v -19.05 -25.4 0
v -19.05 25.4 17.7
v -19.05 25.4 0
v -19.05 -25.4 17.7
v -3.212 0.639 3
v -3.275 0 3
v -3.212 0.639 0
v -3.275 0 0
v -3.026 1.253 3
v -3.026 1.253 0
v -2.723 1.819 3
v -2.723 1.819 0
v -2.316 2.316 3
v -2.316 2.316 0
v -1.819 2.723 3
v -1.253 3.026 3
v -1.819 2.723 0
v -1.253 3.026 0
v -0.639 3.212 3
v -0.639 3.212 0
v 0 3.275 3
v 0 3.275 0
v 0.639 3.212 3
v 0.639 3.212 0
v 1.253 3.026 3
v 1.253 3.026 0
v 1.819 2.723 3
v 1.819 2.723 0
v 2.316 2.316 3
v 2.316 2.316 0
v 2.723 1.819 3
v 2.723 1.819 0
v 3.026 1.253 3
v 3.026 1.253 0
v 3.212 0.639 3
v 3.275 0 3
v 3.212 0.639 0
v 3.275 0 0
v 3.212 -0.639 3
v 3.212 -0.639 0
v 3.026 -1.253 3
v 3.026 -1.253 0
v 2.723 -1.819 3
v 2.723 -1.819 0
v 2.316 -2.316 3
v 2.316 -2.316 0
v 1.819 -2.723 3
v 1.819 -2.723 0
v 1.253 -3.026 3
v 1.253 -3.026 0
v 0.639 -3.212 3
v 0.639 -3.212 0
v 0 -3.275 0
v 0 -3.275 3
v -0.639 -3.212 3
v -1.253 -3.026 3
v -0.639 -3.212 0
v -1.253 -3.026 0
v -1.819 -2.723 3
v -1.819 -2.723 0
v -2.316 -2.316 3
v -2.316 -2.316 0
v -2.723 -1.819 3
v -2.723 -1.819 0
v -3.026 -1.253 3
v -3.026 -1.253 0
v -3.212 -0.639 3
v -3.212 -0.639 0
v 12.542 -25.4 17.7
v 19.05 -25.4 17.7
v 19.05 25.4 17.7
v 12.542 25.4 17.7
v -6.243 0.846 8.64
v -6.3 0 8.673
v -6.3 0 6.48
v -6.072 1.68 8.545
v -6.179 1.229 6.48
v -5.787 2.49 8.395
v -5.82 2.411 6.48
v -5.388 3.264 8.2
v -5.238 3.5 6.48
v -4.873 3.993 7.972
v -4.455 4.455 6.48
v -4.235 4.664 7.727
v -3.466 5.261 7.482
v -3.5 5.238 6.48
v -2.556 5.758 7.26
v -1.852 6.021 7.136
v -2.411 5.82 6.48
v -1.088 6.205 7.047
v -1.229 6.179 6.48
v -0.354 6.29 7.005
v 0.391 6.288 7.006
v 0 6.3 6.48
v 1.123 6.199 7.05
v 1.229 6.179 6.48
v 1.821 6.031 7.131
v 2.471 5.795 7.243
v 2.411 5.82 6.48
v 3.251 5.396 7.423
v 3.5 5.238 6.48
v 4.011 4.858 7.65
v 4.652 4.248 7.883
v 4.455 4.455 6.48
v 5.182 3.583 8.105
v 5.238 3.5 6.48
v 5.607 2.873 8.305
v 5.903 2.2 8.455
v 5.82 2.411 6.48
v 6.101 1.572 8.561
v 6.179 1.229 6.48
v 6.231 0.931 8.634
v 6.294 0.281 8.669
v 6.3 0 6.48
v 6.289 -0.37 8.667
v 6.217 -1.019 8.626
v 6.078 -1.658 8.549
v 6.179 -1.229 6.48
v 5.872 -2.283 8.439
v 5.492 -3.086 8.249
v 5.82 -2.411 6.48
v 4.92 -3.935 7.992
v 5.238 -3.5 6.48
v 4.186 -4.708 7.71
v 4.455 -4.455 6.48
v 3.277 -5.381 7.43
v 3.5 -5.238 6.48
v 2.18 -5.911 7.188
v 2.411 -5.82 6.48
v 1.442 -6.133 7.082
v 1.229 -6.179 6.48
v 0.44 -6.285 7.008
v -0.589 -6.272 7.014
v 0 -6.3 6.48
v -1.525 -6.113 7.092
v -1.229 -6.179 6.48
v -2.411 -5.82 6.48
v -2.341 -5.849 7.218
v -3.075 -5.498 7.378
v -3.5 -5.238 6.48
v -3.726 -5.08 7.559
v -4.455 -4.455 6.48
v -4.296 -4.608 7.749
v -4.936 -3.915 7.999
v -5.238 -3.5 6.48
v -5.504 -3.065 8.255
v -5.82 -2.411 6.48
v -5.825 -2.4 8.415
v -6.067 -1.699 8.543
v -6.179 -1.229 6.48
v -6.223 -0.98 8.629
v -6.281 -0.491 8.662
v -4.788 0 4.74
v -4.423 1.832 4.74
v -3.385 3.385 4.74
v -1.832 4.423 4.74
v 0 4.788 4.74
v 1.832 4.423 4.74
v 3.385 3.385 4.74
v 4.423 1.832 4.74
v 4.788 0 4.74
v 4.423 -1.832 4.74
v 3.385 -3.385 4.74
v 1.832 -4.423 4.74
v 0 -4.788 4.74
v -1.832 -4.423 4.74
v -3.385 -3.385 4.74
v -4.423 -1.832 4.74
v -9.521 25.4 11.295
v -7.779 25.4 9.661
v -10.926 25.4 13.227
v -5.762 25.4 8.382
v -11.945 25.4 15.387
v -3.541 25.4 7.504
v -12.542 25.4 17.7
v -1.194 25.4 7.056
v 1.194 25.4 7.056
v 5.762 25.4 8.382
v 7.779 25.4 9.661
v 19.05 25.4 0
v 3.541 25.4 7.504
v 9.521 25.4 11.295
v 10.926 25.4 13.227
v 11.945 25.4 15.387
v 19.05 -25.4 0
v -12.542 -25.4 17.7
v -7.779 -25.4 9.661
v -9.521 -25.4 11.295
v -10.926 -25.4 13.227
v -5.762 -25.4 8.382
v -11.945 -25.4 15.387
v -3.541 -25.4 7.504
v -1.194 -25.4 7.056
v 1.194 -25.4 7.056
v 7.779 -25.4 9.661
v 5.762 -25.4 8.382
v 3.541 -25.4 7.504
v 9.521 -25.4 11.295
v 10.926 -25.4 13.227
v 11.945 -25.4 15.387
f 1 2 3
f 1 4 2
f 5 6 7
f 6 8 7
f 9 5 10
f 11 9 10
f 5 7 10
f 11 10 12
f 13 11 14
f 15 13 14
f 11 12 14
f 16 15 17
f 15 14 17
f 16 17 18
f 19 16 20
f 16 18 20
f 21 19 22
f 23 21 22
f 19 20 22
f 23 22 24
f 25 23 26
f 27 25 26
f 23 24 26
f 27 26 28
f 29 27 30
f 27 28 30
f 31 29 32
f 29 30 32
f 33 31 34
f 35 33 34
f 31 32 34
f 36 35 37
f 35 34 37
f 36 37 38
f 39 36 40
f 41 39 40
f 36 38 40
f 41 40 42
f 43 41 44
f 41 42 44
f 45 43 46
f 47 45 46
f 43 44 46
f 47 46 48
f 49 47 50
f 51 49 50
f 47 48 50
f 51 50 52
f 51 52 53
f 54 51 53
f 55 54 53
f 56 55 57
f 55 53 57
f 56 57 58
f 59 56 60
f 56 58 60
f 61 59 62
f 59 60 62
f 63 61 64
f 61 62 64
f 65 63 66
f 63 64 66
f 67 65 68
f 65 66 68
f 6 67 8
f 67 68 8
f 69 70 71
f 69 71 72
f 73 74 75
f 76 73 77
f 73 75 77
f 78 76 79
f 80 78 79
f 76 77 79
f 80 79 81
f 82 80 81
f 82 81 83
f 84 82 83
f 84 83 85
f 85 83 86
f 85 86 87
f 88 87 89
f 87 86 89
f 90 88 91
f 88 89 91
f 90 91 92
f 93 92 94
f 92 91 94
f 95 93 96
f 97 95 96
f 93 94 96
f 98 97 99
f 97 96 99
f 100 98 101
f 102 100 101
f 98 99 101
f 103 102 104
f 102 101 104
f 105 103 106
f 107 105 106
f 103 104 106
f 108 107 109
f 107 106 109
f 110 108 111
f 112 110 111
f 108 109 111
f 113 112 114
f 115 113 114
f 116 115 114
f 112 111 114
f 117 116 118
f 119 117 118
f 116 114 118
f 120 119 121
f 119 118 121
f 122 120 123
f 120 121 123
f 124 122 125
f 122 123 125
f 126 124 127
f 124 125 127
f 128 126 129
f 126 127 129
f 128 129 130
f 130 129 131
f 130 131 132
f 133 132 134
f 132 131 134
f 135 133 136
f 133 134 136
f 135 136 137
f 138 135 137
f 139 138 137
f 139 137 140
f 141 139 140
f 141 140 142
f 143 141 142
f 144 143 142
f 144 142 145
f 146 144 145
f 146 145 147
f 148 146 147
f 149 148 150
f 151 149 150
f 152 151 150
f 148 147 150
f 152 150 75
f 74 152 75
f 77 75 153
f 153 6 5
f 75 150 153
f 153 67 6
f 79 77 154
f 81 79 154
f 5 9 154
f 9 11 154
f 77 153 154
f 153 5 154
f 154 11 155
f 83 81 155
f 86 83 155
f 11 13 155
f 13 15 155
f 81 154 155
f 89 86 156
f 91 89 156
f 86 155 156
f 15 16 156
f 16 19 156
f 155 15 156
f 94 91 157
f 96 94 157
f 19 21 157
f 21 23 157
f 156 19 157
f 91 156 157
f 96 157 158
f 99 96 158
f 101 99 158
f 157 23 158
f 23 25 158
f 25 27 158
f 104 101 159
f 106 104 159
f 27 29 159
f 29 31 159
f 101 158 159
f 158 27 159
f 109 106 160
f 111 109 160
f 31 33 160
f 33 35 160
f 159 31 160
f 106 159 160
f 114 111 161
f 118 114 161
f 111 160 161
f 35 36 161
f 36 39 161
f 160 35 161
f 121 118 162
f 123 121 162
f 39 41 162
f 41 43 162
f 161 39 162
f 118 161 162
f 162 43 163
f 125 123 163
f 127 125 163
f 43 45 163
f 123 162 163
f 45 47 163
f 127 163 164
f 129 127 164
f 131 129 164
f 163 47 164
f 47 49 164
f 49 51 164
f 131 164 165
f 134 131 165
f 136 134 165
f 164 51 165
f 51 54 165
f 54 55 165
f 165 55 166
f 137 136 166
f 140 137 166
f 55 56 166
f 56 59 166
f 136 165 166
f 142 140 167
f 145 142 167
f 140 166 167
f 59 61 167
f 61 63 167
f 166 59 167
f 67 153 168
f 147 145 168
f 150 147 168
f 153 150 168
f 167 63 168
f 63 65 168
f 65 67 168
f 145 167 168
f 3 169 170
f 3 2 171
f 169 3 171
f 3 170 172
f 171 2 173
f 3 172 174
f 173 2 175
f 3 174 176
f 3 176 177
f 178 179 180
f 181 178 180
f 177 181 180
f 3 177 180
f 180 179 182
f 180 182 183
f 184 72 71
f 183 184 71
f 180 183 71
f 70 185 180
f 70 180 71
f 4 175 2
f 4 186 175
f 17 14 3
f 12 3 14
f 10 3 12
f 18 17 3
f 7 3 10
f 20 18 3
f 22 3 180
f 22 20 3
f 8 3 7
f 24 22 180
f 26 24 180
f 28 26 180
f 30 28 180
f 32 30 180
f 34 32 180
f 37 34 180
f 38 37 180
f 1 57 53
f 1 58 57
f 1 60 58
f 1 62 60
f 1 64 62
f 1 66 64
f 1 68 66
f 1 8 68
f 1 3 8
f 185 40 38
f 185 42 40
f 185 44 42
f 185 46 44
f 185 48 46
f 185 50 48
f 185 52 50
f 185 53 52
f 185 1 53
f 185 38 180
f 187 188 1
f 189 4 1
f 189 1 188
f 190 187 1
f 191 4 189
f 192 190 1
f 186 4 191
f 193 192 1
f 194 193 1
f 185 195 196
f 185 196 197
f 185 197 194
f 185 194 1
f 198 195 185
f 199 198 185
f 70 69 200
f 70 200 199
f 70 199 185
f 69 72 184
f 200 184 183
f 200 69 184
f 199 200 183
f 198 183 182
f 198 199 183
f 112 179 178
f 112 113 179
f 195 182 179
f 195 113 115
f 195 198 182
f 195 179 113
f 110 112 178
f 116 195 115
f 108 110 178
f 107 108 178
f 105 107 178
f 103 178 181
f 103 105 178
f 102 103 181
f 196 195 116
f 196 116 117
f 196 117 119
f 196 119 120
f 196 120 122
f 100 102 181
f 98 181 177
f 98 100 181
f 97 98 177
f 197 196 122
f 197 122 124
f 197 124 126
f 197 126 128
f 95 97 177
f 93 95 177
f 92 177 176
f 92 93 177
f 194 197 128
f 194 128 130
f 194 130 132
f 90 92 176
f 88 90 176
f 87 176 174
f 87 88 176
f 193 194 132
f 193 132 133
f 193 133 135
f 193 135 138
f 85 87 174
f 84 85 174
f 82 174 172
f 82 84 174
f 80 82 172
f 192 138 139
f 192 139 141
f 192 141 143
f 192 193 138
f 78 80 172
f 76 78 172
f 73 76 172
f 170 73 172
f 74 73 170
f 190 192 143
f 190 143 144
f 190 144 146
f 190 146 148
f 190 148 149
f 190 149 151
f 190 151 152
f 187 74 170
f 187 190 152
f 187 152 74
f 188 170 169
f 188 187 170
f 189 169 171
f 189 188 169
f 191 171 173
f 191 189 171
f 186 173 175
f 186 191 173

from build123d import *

# Parameters (mm, degrees)
F2_DEPTH = 25.4


with BuildPart() as f2:
    # F0 (on Front) → F2 (new body, symmetric)
    with BuildSketch(Plane.XZ):
        with BuildLine():
            Line((-19.05, 17.7), (-19.05, 0))
            Line((-19.05, 0), (19.05, 0))
            Line((19.05, 0), (19.05, 17.7))
            Line((19.05, 17.7), (12.541531, 17.7))
            ThreePointArc((12.541531, 17.7), (0, 7), (-12.541531, 17.7))
            Line((-12.541531, 17.7), (-19.05, 17.7))
        make_face()
    extrude(amount=F2_DEPTH, both=True)

    # F1 (on Front) → F3 (revolve, cut)
    with BuildSketch(Plane.XZ):
        Polygon((0, 17.176644), (-6.3, 17.176644), (-6.3, 7), (-6.3, 6.479864), (-3.275, 3), (-3.275, 0), (0, 0), align=None)
    revolve(axis=Axis((0, 0, 8.588322), (0, 0, -1)), mode=Mode.SUBTRACT)


solid = f2.part
